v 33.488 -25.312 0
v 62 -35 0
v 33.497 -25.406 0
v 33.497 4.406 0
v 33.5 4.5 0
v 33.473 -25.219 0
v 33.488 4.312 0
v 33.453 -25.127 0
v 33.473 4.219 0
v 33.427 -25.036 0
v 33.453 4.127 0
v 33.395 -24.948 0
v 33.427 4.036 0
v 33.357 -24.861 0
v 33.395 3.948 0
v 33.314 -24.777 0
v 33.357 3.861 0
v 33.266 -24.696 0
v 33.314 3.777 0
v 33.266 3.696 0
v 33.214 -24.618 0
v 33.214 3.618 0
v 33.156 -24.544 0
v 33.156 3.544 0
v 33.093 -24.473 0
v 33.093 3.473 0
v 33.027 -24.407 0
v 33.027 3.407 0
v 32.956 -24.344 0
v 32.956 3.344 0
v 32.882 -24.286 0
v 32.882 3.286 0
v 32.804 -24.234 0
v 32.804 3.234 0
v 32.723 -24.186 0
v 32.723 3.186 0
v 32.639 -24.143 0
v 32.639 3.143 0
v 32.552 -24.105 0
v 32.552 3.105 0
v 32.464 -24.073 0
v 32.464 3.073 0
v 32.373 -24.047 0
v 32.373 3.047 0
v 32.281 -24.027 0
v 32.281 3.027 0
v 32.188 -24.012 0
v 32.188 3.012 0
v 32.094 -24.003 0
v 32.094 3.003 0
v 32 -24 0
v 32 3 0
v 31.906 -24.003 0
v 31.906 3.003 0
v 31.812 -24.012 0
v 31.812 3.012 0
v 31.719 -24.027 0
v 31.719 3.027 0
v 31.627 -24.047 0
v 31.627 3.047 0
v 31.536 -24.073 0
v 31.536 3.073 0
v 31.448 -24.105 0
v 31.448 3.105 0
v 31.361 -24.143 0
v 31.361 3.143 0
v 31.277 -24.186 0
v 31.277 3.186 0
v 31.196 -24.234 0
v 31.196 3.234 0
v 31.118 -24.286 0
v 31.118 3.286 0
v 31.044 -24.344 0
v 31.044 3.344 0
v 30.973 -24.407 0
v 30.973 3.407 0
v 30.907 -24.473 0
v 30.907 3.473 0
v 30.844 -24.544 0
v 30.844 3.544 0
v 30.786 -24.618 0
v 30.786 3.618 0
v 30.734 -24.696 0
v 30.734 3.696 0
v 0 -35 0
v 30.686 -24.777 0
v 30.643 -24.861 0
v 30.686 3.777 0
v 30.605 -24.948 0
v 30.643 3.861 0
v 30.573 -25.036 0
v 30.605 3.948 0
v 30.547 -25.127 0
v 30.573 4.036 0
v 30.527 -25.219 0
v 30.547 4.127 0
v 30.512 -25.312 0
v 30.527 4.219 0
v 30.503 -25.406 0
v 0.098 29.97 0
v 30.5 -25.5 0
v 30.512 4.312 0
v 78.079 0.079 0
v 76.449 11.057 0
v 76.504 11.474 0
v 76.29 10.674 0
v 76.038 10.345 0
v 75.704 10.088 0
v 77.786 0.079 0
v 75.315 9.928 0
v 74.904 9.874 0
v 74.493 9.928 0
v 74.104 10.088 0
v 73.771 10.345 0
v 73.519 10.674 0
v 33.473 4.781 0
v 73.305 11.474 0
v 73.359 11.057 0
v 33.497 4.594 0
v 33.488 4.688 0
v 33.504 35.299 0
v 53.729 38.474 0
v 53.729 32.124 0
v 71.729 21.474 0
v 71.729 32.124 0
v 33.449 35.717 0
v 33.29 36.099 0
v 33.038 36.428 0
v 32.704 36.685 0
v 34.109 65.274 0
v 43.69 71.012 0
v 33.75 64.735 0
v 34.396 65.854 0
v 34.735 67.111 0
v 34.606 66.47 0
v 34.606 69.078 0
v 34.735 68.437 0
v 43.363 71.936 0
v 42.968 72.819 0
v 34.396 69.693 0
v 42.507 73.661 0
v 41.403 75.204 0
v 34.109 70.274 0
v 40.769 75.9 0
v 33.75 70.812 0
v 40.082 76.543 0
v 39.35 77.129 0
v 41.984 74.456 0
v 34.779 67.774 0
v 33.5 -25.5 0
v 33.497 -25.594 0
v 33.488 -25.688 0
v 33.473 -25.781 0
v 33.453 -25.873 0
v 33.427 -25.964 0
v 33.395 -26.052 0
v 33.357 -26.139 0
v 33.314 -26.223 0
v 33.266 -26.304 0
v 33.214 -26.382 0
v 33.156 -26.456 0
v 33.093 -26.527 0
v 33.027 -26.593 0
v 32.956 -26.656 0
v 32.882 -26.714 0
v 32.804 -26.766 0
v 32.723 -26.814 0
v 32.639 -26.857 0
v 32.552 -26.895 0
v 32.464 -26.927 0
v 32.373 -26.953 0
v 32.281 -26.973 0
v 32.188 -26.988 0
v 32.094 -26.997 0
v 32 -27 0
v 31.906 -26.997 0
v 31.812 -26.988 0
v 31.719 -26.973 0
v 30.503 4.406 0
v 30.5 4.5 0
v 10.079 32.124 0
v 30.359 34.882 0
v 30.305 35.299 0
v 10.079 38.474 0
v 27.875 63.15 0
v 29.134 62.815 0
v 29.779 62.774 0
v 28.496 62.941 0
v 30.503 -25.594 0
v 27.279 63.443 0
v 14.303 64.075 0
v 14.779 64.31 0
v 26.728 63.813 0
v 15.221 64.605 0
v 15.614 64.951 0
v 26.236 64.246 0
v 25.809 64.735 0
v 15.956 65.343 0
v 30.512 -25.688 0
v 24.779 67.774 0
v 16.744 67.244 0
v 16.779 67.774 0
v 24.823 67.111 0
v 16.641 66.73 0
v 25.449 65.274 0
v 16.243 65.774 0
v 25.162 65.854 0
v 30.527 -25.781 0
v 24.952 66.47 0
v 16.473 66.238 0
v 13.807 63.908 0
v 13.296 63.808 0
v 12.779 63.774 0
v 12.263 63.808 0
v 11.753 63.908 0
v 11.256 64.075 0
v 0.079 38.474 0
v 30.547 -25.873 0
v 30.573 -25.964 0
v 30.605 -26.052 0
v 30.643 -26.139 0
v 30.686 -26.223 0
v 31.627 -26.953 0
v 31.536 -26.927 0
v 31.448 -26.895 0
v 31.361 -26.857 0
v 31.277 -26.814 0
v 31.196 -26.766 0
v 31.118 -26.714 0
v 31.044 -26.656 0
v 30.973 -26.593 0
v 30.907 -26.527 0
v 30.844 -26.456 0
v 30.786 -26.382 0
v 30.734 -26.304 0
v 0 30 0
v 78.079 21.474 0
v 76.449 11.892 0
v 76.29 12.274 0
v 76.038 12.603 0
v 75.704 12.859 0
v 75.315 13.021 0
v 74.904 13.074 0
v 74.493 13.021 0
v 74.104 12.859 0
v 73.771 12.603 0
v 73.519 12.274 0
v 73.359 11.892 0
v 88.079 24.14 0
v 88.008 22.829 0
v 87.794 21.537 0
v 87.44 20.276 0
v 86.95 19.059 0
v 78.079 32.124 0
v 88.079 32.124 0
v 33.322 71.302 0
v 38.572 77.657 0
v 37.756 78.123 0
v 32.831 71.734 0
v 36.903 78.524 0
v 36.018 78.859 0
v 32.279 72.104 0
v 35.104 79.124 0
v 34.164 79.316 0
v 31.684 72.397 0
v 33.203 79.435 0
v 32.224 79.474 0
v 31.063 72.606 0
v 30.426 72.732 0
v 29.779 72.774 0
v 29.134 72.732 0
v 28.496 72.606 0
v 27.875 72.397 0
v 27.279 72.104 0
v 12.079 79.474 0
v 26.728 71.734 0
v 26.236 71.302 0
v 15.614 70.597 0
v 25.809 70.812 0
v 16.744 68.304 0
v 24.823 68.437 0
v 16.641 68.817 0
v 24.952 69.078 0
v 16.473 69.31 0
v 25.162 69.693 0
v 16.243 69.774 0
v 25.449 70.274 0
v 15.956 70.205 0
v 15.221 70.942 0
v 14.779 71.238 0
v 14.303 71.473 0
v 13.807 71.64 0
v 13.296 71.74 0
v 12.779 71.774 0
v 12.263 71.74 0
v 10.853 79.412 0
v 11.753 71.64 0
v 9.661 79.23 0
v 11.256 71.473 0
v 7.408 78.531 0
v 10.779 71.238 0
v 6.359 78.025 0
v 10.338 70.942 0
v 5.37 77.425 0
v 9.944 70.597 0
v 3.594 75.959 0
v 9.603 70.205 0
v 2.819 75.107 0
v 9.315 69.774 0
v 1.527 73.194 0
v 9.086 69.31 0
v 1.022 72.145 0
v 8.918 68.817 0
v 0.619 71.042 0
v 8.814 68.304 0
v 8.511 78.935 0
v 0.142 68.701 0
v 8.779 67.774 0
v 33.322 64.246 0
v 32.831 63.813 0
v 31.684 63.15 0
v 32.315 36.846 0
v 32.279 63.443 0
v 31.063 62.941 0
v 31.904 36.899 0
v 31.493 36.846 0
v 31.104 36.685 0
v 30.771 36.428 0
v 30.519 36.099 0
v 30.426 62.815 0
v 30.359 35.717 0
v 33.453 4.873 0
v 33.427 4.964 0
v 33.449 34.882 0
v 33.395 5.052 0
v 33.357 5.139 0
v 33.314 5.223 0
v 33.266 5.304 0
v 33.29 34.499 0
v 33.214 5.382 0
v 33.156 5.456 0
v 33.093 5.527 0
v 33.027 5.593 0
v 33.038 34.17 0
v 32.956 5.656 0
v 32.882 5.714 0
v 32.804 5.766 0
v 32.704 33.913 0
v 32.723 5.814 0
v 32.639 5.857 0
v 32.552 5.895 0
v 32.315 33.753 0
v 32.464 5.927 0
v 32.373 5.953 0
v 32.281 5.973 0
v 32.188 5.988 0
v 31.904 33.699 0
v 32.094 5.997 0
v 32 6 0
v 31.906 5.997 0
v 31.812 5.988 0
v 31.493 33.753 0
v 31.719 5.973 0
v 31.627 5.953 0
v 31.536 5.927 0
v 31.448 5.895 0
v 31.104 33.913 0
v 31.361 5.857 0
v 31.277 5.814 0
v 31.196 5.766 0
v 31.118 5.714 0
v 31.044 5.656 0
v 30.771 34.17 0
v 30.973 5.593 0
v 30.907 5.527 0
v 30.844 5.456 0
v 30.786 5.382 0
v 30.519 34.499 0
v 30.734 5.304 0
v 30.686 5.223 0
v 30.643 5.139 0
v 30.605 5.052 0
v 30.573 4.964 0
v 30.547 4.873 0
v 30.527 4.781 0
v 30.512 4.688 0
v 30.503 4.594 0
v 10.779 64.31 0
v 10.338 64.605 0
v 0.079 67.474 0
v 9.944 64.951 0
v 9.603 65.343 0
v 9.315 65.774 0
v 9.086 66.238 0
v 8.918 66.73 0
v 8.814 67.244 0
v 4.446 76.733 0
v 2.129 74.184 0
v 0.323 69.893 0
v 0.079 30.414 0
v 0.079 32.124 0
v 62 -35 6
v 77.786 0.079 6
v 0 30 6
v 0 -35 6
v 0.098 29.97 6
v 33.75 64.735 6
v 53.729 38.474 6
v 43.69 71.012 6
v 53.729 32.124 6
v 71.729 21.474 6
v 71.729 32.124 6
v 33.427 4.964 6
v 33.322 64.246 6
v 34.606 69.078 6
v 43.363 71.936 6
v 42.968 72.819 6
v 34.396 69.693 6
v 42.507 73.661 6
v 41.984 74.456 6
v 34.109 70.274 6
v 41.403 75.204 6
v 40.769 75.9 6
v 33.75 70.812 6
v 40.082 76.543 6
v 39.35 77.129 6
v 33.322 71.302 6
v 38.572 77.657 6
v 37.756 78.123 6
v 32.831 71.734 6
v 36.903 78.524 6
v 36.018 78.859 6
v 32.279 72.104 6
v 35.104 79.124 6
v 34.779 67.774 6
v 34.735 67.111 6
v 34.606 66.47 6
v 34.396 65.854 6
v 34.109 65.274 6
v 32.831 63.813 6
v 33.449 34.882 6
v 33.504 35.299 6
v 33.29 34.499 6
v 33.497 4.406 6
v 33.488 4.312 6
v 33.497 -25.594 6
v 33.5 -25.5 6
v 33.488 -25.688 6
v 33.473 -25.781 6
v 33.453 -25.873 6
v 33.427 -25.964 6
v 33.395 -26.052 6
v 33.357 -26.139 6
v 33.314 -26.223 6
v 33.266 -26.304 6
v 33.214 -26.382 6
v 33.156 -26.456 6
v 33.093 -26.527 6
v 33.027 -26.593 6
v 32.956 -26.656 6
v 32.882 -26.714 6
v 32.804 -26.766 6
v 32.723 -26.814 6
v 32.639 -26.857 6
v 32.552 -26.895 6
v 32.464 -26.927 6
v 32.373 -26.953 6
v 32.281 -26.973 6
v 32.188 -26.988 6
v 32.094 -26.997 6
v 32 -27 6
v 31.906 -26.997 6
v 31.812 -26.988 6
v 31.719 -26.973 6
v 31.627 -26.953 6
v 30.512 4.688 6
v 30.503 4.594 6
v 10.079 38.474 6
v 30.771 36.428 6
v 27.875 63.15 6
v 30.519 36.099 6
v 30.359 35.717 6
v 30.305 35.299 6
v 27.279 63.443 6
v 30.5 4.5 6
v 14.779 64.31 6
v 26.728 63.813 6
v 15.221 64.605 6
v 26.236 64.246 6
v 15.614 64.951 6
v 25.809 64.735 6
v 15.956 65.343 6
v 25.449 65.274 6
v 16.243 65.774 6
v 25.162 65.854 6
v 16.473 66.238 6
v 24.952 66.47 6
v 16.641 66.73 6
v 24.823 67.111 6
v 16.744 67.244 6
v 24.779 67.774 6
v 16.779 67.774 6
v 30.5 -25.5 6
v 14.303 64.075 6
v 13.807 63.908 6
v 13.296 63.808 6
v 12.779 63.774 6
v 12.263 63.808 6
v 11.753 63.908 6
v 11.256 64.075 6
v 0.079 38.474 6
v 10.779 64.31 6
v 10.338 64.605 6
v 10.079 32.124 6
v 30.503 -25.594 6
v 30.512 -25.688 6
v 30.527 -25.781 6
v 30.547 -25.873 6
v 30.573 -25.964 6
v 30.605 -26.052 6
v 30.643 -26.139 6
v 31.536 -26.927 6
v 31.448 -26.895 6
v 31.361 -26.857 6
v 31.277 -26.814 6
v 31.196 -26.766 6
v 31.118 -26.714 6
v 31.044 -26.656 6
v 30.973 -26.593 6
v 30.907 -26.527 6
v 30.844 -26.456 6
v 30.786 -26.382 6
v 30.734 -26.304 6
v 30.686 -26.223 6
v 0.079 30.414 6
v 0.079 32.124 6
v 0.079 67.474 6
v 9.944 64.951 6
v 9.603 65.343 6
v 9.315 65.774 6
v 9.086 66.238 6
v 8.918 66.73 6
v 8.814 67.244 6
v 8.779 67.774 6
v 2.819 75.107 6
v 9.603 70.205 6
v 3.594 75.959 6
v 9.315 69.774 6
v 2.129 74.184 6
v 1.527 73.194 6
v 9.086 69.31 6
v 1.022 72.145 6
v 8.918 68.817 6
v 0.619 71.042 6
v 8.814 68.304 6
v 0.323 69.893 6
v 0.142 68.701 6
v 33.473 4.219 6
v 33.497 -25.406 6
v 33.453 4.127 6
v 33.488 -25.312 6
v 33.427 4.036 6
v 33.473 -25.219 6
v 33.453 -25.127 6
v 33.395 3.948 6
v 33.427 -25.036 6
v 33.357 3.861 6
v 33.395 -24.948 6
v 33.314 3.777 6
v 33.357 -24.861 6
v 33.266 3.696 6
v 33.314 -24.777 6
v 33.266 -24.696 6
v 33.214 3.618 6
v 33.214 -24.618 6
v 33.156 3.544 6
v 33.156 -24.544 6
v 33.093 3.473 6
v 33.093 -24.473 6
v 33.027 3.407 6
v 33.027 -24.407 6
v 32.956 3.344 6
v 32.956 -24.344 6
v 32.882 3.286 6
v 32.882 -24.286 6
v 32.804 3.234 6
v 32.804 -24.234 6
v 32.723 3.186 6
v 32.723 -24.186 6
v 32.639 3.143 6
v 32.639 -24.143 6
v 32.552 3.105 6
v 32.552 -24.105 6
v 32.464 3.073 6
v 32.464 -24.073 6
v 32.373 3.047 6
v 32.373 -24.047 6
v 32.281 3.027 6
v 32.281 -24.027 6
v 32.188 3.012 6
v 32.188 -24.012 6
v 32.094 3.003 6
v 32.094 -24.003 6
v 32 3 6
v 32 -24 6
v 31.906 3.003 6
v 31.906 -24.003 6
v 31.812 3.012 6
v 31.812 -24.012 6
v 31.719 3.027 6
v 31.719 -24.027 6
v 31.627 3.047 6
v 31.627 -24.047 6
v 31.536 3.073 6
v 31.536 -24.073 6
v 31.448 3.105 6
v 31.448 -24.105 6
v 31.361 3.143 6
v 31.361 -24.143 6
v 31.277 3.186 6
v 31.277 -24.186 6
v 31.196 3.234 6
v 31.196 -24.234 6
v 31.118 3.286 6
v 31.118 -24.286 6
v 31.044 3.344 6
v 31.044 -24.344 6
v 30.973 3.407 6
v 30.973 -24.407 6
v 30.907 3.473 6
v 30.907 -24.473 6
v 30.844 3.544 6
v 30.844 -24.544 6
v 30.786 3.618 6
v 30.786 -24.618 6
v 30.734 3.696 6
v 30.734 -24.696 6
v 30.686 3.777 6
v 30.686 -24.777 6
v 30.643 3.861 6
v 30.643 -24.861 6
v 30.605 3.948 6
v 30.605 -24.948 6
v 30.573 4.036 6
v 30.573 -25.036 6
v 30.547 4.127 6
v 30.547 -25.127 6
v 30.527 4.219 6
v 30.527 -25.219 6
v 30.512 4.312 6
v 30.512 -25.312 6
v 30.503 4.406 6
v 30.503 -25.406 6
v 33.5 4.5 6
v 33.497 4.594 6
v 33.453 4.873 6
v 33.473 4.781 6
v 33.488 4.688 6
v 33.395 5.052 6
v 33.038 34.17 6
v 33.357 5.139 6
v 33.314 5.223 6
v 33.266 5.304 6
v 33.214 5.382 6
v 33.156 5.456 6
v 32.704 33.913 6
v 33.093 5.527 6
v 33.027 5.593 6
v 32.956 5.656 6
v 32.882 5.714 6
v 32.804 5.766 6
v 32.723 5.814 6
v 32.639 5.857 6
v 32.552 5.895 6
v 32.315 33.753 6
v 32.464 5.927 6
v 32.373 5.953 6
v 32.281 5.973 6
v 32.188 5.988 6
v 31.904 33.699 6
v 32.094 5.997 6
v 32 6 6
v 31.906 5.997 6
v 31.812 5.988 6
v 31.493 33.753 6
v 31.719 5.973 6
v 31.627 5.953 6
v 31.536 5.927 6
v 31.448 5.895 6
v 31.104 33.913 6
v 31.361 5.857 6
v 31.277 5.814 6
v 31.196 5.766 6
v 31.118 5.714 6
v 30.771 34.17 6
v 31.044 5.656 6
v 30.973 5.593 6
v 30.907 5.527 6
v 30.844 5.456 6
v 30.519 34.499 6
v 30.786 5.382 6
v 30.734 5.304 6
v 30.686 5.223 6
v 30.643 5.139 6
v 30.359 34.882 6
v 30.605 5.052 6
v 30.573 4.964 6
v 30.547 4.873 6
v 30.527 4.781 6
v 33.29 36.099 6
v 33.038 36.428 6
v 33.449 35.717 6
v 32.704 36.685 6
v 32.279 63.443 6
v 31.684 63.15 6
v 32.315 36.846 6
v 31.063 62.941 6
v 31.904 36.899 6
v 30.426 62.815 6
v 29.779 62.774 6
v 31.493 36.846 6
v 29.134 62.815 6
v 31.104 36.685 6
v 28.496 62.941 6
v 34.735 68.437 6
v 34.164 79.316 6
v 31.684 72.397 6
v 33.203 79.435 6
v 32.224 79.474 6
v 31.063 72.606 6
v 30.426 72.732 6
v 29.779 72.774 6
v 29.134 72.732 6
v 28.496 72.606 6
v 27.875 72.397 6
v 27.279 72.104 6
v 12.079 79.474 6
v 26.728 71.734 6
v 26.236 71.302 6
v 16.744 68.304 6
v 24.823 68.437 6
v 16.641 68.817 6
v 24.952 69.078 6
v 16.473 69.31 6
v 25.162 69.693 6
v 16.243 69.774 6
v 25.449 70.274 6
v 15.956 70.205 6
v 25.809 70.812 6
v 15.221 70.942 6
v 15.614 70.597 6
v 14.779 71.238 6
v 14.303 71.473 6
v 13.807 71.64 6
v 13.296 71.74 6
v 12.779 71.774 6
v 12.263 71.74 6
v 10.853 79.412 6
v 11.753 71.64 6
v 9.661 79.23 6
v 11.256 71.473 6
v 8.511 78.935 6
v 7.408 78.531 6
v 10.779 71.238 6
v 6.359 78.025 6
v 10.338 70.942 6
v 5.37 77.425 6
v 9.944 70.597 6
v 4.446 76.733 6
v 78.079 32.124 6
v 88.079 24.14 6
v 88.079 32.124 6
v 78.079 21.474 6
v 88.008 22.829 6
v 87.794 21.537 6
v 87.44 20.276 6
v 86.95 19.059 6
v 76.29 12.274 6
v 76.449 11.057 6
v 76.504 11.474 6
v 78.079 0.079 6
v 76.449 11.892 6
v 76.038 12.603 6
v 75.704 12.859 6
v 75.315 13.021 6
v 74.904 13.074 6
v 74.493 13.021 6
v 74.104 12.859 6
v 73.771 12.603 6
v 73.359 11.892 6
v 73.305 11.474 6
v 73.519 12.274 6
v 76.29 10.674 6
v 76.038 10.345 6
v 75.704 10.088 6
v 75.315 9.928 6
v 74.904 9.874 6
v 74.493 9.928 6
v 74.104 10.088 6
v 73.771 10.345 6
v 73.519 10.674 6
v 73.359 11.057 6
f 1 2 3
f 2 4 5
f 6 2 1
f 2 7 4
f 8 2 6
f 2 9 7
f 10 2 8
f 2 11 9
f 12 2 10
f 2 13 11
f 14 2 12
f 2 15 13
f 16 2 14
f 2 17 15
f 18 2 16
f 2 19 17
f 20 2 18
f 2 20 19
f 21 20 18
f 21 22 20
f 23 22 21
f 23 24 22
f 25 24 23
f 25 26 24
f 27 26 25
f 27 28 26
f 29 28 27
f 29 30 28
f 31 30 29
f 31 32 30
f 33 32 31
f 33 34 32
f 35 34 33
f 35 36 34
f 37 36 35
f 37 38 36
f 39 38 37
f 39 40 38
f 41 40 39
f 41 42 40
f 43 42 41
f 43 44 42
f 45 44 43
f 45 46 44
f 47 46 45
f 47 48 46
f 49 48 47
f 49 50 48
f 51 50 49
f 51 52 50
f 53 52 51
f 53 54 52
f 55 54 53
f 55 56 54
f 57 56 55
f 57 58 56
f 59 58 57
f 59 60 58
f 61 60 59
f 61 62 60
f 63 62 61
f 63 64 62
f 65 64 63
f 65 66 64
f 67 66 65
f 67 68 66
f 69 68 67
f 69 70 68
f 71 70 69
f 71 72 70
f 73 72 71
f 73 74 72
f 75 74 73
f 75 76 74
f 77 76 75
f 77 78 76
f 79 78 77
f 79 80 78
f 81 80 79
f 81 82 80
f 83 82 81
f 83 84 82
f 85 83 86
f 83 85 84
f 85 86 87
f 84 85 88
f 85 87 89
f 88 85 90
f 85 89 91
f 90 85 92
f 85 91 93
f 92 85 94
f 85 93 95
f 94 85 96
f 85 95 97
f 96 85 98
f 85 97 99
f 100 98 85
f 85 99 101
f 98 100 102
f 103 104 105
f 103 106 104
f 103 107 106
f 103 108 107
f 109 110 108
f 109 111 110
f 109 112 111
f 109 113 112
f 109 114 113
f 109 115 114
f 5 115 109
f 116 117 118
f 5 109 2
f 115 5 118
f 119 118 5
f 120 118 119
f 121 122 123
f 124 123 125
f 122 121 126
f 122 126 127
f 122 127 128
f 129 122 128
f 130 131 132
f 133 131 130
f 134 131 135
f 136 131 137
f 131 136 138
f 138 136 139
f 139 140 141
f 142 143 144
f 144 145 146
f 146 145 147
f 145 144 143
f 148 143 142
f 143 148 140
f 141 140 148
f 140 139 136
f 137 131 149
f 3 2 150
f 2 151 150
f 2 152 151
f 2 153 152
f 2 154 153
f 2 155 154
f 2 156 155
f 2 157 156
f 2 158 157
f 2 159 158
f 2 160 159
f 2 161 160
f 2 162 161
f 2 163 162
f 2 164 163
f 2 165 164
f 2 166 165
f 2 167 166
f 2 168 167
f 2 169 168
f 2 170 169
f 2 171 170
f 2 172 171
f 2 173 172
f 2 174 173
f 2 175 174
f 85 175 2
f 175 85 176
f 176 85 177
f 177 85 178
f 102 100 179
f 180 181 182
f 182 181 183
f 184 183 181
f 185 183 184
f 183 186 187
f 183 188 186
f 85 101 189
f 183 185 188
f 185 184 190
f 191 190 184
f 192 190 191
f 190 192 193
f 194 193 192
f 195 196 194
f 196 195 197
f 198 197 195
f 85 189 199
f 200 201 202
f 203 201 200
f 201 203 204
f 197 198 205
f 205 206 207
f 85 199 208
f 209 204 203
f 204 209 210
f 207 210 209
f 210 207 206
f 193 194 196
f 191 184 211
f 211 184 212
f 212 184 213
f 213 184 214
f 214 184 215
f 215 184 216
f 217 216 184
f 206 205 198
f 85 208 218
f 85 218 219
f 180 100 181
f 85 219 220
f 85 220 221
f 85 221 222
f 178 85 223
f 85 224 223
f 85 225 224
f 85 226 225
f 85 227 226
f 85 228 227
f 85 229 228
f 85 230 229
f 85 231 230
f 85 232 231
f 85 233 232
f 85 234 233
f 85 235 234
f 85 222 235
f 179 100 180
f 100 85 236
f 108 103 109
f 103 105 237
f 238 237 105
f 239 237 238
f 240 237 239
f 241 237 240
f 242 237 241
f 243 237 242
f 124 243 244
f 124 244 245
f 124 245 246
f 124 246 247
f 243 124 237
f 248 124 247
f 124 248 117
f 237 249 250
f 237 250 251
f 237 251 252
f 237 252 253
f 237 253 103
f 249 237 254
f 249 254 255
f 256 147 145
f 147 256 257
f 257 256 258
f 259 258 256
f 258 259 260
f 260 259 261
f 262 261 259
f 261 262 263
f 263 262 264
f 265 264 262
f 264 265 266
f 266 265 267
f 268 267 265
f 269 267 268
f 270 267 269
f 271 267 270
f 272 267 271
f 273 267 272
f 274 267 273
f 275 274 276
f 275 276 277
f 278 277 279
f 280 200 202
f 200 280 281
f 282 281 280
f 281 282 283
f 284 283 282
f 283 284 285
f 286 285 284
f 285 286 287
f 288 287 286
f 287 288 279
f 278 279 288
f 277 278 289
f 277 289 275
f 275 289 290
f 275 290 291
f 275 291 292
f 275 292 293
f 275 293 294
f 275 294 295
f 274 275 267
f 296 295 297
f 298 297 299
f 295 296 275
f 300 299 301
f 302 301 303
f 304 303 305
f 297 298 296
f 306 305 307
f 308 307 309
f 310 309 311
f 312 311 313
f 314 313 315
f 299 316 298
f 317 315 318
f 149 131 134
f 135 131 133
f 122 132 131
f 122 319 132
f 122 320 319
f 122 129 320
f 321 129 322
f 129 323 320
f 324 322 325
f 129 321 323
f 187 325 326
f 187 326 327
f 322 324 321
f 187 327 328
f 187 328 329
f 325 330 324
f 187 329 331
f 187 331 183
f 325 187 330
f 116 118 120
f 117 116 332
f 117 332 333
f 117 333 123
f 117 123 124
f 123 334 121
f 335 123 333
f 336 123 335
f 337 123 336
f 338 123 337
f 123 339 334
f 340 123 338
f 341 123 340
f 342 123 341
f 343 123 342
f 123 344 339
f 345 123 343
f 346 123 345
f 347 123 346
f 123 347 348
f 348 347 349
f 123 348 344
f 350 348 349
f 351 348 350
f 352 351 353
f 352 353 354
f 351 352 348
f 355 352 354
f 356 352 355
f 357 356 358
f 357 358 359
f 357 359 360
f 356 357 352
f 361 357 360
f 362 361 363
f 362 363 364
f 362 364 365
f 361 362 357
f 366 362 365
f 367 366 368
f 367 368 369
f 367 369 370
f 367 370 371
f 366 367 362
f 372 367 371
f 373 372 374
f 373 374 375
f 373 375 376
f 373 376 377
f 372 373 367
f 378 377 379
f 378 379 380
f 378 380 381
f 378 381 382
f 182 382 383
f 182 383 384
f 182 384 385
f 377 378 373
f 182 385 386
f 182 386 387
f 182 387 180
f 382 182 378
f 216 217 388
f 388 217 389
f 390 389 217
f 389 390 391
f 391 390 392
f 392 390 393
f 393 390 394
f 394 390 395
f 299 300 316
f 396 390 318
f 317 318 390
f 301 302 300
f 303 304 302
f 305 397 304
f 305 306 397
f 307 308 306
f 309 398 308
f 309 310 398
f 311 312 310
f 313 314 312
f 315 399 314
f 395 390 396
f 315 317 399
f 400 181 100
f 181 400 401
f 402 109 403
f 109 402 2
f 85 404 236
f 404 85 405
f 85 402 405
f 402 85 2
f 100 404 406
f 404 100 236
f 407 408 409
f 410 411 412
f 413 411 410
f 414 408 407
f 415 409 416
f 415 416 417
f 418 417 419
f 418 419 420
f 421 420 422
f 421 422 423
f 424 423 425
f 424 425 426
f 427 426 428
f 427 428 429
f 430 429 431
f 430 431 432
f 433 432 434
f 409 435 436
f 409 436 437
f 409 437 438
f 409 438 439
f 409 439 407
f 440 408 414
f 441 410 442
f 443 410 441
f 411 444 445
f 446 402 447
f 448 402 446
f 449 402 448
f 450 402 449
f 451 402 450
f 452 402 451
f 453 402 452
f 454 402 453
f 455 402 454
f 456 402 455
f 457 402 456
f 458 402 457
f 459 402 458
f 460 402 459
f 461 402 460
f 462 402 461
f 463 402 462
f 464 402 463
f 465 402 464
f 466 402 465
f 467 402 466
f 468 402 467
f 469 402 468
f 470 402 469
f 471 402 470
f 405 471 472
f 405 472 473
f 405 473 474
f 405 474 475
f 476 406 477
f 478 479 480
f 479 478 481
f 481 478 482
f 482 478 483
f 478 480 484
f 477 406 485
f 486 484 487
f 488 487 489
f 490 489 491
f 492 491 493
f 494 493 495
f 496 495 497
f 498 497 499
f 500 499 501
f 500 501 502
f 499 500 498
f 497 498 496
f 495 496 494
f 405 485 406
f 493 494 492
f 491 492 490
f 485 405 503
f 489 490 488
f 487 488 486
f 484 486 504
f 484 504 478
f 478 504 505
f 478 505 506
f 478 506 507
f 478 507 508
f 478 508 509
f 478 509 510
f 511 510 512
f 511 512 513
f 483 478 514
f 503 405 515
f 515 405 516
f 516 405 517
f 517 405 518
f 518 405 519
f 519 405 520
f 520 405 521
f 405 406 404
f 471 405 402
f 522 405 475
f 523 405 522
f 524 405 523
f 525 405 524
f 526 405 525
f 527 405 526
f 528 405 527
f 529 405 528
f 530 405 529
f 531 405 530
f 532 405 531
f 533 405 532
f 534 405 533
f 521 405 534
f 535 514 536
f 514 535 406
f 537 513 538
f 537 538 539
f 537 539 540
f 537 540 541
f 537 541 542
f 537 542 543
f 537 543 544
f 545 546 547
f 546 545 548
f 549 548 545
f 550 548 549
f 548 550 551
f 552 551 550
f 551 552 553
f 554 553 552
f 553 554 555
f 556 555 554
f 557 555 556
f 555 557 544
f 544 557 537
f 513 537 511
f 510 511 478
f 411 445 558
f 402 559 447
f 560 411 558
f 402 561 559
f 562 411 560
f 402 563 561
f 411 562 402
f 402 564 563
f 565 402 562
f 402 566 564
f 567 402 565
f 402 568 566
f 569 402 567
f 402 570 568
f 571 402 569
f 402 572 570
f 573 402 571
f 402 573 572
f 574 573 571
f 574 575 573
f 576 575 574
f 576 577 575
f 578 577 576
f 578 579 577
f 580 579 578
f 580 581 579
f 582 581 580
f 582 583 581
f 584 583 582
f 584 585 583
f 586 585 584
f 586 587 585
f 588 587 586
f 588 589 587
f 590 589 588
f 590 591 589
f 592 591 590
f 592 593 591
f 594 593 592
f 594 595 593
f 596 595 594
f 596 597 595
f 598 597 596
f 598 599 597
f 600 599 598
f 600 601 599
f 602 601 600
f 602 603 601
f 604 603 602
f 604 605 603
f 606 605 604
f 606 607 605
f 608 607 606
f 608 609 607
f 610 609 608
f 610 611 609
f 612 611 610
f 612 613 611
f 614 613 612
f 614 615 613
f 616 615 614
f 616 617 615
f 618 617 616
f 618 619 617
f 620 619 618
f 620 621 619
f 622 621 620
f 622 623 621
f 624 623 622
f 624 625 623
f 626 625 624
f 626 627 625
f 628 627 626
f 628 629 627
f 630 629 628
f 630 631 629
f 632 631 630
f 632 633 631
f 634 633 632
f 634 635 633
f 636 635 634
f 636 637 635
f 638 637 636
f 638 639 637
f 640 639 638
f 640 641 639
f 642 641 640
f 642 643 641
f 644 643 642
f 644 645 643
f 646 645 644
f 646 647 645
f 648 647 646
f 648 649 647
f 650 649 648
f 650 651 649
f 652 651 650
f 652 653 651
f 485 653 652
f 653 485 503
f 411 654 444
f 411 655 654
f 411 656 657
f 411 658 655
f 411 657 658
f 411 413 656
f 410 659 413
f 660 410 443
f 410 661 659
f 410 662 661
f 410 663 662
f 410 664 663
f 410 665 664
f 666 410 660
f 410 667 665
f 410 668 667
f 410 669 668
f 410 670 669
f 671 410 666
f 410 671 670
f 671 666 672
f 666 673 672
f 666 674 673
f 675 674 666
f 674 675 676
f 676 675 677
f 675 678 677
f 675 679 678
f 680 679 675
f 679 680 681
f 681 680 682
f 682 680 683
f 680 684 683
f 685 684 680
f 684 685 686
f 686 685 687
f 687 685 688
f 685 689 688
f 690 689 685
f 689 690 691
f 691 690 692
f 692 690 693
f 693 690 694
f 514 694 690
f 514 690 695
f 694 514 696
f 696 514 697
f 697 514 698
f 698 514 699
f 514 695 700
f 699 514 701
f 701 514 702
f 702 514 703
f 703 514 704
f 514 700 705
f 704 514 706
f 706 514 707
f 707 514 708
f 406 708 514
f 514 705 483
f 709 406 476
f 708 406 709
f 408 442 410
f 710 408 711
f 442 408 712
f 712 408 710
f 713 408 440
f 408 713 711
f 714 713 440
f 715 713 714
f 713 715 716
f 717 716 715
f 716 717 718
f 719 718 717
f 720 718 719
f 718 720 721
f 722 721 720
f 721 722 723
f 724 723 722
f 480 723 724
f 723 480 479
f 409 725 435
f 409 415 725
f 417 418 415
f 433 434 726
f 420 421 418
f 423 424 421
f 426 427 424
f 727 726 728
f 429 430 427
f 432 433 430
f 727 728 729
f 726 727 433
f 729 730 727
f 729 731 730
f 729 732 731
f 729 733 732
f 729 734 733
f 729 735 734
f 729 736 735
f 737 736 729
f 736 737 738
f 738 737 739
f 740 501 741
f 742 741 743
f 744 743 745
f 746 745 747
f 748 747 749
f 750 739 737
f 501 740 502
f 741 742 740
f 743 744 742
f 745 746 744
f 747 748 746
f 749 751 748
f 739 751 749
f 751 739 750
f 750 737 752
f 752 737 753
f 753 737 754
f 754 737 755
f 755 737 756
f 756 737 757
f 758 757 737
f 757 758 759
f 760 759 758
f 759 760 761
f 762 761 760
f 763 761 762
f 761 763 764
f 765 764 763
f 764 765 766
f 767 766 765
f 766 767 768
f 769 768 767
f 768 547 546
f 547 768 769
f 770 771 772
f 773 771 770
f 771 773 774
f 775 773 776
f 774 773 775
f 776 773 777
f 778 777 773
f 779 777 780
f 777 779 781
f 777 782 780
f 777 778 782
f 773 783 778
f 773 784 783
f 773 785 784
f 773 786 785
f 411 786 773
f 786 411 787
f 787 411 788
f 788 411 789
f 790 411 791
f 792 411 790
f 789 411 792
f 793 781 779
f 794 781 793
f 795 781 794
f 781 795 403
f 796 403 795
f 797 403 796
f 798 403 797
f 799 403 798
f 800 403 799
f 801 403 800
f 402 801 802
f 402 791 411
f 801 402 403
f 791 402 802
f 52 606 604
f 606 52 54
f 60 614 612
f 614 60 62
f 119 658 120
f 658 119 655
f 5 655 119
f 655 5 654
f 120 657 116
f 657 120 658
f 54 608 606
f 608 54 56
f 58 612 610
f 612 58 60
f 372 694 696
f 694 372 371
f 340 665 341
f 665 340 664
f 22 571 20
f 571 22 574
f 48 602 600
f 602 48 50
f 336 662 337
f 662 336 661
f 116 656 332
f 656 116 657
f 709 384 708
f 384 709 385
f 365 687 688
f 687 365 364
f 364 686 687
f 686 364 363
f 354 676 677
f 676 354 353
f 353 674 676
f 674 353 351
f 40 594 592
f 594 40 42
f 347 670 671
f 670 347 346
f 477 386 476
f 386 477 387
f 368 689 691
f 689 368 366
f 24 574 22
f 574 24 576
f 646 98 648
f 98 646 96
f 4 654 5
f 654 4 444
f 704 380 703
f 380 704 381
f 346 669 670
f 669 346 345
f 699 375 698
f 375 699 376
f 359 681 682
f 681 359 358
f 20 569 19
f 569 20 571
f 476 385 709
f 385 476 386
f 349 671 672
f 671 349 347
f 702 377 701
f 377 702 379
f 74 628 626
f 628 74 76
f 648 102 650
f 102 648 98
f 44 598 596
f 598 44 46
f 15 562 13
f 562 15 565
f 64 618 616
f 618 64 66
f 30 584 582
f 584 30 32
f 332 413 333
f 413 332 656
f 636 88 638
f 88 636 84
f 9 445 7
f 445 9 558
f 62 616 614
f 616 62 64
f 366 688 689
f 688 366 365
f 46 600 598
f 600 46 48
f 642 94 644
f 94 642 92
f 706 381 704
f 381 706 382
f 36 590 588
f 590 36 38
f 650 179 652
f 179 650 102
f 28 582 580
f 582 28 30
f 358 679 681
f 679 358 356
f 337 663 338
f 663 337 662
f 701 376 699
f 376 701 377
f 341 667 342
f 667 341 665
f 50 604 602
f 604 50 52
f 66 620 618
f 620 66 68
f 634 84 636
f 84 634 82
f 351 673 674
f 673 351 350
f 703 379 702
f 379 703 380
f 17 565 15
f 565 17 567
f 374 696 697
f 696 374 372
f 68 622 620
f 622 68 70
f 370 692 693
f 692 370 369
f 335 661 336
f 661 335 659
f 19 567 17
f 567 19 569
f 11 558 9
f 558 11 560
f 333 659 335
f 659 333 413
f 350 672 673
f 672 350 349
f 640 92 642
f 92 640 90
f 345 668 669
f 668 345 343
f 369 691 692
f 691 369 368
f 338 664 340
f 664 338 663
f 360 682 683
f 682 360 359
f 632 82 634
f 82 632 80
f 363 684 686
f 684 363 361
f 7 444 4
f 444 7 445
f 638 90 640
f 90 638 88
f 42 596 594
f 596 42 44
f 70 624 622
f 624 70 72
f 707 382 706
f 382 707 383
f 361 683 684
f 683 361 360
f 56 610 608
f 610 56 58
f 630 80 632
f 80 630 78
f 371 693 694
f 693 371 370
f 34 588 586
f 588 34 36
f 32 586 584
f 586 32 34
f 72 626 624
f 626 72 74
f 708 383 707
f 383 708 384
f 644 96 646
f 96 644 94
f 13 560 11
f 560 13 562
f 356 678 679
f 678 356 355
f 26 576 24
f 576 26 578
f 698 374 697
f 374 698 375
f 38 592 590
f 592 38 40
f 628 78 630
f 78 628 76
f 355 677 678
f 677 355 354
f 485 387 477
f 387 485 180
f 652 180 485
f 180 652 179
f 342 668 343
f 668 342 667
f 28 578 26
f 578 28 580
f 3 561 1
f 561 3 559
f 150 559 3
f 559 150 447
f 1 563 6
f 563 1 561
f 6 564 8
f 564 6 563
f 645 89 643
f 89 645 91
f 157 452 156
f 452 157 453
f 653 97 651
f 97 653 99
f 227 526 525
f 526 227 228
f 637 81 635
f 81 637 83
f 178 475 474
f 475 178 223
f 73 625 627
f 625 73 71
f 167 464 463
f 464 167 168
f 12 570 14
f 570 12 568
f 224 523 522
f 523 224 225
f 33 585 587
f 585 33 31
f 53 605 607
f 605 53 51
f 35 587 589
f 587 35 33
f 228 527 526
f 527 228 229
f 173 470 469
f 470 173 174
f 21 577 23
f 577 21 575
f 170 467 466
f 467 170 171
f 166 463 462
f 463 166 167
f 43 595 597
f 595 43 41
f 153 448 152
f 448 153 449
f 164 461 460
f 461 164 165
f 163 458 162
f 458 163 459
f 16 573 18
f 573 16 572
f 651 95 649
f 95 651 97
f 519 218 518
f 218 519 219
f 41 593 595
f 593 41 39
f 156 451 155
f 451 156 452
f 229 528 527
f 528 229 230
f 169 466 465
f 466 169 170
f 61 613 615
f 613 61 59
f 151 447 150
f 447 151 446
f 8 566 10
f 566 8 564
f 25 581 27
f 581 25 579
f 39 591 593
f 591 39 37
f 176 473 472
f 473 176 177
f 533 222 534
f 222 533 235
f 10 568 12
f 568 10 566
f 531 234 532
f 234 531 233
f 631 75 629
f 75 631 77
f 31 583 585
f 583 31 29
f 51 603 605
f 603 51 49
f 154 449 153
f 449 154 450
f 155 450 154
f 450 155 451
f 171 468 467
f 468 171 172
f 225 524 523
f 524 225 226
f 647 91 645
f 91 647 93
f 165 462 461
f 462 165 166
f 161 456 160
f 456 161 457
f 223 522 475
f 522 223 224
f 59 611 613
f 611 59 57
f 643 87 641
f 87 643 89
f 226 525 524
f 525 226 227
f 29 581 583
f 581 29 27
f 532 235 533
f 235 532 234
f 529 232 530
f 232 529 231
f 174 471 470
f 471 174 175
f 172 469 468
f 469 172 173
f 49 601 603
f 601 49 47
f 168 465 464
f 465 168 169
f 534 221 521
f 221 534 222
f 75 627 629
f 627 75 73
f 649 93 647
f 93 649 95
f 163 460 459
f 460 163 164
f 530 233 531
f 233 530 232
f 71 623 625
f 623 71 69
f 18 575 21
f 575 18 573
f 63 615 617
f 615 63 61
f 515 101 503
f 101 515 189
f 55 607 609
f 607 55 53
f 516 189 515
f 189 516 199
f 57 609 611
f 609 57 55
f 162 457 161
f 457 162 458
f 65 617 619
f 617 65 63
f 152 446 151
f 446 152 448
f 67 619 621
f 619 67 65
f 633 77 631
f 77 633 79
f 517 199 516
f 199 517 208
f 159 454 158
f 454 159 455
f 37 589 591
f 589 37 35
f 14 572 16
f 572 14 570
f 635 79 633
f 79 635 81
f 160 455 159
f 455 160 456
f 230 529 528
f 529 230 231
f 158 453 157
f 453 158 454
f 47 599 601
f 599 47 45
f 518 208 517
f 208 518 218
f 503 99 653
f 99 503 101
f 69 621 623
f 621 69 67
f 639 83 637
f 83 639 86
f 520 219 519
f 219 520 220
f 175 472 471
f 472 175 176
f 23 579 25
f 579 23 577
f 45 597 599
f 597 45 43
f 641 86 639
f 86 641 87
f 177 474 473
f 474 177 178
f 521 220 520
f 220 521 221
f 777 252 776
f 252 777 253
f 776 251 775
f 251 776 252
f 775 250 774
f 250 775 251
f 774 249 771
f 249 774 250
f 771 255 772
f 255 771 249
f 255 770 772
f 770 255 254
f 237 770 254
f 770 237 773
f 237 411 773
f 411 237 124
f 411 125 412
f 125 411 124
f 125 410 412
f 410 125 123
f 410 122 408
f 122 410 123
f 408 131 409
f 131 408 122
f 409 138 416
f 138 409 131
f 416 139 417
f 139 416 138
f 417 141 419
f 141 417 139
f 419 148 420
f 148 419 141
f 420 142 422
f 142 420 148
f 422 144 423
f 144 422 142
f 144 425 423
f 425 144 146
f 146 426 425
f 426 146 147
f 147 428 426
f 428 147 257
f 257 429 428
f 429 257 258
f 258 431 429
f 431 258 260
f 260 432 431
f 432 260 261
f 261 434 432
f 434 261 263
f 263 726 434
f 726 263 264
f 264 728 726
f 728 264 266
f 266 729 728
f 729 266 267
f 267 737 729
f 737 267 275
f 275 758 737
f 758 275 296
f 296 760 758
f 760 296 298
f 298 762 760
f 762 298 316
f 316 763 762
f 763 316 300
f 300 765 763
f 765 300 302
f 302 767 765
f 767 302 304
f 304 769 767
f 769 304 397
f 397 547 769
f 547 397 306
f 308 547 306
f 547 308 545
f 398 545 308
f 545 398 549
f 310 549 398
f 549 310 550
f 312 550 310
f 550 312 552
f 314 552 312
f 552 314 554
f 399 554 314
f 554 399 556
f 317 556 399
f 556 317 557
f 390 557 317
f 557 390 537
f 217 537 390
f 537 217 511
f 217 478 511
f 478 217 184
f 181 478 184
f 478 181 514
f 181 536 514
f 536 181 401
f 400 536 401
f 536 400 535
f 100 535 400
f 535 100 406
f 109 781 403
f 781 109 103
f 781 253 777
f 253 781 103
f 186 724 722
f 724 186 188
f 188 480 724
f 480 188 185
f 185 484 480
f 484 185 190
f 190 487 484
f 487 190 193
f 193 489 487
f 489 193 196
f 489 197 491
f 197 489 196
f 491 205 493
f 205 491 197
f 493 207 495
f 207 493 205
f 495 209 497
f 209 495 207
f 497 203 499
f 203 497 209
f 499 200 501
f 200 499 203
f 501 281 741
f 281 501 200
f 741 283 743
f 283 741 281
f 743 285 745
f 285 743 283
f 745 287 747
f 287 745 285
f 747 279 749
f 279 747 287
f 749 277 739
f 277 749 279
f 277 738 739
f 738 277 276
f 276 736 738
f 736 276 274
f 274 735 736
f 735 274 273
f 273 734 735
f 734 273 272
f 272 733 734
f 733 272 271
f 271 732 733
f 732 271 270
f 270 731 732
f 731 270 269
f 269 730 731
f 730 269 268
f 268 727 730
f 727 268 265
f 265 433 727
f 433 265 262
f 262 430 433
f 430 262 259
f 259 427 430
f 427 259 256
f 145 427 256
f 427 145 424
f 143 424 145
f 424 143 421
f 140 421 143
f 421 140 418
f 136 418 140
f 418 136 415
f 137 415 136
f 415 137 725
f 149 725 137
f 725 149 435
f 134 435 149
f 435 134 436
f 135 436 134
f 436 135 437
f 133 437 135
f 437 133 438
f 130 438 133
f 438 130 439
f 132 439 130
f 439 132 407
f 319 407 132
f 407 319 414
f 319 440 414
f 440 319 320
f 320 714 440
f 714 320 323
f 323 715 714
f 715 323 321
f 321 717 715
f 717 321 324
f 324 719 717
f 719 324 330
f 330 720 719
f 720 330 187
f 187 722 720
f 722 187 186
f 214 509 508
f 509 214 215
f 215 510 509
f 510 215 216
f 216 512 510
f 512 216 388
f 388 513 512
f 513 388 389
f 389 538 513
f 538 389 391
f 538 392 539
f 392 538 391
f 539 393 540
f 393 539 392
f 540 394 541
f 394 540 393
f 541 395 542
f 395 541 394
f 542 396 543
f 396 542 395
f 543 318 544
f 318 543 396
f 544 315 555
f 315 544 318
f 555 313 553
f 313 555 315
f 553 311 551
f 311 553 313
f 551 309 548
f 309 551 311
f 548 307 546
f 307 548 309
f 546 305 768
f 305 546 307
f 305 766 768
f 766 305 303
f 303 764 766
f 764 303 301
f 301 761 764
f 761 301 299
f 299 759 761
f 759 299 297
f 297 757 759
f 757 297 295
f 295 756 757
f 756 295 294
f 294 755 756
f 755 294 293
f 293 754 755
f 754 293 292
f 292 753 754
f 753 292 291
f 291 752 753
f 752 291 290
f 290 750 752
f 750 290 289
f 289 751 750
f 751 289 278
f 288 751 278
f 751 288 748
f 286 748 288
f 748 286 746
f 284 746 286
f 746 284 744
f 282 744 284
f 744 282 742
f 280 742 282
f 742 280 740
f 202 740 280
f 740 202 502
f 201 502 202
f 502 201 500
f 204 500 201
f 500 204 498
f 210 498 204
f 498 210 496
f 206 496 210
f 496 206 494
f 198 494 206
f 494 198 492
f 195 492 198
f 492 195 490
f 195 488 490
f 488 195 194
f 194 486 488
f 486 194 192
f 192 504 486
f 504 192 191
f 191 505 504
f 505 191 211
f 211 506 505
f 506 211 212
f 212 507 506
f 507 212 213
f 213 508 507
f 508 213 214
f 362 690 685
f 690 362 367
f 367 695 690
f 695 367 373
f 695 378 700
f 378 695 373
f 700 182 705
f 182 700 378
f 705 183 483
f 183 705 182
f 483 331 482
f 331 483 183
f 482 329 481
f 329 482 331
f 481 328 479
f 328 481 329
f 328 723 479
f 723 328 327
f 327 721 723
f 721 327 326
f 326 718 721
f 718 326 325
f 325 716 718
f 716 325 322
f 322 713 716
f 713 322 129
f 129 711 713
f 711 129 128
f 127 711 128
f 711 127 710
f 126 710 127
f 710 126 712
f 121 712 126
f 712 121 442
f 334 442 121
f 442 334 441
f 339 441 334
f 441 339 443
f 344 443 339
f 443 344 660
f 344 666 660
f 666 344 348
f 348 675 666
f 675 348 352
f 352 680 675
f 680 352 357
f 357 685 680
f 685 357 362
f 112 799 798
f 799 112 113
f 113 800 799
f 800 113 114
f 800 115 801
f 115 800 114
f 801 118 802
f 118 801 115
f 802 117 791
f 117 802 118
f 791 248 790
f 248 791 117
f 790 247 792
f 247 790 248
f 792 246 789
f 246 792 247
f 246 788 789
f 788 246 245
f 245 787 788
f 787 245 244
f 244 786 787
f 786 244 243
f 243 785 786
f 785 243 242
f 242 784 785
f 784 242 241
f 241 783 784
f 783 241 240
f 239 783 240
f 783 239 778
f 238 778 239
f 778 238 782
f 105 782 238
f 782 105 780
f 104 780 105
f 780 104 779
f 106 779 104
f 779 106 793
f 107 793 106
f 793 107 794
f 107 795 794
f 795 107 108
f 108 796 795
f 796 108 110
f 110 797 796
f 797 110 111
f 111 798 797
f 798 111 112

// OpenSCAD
linear_extrude(6) import("brace.dxf");

$fn=100;

difference() {
    linear_extrude(6) {
        polygon([
            [0,-35],
            [0,+30],
            [80,+5],
            [62,-35]
        ]);
        
    }
translate([32,4.5,0]) cylinder(d=3, h=20);
translate([32,4.5-30,0]) cylinder(d=3, h=20);
}
